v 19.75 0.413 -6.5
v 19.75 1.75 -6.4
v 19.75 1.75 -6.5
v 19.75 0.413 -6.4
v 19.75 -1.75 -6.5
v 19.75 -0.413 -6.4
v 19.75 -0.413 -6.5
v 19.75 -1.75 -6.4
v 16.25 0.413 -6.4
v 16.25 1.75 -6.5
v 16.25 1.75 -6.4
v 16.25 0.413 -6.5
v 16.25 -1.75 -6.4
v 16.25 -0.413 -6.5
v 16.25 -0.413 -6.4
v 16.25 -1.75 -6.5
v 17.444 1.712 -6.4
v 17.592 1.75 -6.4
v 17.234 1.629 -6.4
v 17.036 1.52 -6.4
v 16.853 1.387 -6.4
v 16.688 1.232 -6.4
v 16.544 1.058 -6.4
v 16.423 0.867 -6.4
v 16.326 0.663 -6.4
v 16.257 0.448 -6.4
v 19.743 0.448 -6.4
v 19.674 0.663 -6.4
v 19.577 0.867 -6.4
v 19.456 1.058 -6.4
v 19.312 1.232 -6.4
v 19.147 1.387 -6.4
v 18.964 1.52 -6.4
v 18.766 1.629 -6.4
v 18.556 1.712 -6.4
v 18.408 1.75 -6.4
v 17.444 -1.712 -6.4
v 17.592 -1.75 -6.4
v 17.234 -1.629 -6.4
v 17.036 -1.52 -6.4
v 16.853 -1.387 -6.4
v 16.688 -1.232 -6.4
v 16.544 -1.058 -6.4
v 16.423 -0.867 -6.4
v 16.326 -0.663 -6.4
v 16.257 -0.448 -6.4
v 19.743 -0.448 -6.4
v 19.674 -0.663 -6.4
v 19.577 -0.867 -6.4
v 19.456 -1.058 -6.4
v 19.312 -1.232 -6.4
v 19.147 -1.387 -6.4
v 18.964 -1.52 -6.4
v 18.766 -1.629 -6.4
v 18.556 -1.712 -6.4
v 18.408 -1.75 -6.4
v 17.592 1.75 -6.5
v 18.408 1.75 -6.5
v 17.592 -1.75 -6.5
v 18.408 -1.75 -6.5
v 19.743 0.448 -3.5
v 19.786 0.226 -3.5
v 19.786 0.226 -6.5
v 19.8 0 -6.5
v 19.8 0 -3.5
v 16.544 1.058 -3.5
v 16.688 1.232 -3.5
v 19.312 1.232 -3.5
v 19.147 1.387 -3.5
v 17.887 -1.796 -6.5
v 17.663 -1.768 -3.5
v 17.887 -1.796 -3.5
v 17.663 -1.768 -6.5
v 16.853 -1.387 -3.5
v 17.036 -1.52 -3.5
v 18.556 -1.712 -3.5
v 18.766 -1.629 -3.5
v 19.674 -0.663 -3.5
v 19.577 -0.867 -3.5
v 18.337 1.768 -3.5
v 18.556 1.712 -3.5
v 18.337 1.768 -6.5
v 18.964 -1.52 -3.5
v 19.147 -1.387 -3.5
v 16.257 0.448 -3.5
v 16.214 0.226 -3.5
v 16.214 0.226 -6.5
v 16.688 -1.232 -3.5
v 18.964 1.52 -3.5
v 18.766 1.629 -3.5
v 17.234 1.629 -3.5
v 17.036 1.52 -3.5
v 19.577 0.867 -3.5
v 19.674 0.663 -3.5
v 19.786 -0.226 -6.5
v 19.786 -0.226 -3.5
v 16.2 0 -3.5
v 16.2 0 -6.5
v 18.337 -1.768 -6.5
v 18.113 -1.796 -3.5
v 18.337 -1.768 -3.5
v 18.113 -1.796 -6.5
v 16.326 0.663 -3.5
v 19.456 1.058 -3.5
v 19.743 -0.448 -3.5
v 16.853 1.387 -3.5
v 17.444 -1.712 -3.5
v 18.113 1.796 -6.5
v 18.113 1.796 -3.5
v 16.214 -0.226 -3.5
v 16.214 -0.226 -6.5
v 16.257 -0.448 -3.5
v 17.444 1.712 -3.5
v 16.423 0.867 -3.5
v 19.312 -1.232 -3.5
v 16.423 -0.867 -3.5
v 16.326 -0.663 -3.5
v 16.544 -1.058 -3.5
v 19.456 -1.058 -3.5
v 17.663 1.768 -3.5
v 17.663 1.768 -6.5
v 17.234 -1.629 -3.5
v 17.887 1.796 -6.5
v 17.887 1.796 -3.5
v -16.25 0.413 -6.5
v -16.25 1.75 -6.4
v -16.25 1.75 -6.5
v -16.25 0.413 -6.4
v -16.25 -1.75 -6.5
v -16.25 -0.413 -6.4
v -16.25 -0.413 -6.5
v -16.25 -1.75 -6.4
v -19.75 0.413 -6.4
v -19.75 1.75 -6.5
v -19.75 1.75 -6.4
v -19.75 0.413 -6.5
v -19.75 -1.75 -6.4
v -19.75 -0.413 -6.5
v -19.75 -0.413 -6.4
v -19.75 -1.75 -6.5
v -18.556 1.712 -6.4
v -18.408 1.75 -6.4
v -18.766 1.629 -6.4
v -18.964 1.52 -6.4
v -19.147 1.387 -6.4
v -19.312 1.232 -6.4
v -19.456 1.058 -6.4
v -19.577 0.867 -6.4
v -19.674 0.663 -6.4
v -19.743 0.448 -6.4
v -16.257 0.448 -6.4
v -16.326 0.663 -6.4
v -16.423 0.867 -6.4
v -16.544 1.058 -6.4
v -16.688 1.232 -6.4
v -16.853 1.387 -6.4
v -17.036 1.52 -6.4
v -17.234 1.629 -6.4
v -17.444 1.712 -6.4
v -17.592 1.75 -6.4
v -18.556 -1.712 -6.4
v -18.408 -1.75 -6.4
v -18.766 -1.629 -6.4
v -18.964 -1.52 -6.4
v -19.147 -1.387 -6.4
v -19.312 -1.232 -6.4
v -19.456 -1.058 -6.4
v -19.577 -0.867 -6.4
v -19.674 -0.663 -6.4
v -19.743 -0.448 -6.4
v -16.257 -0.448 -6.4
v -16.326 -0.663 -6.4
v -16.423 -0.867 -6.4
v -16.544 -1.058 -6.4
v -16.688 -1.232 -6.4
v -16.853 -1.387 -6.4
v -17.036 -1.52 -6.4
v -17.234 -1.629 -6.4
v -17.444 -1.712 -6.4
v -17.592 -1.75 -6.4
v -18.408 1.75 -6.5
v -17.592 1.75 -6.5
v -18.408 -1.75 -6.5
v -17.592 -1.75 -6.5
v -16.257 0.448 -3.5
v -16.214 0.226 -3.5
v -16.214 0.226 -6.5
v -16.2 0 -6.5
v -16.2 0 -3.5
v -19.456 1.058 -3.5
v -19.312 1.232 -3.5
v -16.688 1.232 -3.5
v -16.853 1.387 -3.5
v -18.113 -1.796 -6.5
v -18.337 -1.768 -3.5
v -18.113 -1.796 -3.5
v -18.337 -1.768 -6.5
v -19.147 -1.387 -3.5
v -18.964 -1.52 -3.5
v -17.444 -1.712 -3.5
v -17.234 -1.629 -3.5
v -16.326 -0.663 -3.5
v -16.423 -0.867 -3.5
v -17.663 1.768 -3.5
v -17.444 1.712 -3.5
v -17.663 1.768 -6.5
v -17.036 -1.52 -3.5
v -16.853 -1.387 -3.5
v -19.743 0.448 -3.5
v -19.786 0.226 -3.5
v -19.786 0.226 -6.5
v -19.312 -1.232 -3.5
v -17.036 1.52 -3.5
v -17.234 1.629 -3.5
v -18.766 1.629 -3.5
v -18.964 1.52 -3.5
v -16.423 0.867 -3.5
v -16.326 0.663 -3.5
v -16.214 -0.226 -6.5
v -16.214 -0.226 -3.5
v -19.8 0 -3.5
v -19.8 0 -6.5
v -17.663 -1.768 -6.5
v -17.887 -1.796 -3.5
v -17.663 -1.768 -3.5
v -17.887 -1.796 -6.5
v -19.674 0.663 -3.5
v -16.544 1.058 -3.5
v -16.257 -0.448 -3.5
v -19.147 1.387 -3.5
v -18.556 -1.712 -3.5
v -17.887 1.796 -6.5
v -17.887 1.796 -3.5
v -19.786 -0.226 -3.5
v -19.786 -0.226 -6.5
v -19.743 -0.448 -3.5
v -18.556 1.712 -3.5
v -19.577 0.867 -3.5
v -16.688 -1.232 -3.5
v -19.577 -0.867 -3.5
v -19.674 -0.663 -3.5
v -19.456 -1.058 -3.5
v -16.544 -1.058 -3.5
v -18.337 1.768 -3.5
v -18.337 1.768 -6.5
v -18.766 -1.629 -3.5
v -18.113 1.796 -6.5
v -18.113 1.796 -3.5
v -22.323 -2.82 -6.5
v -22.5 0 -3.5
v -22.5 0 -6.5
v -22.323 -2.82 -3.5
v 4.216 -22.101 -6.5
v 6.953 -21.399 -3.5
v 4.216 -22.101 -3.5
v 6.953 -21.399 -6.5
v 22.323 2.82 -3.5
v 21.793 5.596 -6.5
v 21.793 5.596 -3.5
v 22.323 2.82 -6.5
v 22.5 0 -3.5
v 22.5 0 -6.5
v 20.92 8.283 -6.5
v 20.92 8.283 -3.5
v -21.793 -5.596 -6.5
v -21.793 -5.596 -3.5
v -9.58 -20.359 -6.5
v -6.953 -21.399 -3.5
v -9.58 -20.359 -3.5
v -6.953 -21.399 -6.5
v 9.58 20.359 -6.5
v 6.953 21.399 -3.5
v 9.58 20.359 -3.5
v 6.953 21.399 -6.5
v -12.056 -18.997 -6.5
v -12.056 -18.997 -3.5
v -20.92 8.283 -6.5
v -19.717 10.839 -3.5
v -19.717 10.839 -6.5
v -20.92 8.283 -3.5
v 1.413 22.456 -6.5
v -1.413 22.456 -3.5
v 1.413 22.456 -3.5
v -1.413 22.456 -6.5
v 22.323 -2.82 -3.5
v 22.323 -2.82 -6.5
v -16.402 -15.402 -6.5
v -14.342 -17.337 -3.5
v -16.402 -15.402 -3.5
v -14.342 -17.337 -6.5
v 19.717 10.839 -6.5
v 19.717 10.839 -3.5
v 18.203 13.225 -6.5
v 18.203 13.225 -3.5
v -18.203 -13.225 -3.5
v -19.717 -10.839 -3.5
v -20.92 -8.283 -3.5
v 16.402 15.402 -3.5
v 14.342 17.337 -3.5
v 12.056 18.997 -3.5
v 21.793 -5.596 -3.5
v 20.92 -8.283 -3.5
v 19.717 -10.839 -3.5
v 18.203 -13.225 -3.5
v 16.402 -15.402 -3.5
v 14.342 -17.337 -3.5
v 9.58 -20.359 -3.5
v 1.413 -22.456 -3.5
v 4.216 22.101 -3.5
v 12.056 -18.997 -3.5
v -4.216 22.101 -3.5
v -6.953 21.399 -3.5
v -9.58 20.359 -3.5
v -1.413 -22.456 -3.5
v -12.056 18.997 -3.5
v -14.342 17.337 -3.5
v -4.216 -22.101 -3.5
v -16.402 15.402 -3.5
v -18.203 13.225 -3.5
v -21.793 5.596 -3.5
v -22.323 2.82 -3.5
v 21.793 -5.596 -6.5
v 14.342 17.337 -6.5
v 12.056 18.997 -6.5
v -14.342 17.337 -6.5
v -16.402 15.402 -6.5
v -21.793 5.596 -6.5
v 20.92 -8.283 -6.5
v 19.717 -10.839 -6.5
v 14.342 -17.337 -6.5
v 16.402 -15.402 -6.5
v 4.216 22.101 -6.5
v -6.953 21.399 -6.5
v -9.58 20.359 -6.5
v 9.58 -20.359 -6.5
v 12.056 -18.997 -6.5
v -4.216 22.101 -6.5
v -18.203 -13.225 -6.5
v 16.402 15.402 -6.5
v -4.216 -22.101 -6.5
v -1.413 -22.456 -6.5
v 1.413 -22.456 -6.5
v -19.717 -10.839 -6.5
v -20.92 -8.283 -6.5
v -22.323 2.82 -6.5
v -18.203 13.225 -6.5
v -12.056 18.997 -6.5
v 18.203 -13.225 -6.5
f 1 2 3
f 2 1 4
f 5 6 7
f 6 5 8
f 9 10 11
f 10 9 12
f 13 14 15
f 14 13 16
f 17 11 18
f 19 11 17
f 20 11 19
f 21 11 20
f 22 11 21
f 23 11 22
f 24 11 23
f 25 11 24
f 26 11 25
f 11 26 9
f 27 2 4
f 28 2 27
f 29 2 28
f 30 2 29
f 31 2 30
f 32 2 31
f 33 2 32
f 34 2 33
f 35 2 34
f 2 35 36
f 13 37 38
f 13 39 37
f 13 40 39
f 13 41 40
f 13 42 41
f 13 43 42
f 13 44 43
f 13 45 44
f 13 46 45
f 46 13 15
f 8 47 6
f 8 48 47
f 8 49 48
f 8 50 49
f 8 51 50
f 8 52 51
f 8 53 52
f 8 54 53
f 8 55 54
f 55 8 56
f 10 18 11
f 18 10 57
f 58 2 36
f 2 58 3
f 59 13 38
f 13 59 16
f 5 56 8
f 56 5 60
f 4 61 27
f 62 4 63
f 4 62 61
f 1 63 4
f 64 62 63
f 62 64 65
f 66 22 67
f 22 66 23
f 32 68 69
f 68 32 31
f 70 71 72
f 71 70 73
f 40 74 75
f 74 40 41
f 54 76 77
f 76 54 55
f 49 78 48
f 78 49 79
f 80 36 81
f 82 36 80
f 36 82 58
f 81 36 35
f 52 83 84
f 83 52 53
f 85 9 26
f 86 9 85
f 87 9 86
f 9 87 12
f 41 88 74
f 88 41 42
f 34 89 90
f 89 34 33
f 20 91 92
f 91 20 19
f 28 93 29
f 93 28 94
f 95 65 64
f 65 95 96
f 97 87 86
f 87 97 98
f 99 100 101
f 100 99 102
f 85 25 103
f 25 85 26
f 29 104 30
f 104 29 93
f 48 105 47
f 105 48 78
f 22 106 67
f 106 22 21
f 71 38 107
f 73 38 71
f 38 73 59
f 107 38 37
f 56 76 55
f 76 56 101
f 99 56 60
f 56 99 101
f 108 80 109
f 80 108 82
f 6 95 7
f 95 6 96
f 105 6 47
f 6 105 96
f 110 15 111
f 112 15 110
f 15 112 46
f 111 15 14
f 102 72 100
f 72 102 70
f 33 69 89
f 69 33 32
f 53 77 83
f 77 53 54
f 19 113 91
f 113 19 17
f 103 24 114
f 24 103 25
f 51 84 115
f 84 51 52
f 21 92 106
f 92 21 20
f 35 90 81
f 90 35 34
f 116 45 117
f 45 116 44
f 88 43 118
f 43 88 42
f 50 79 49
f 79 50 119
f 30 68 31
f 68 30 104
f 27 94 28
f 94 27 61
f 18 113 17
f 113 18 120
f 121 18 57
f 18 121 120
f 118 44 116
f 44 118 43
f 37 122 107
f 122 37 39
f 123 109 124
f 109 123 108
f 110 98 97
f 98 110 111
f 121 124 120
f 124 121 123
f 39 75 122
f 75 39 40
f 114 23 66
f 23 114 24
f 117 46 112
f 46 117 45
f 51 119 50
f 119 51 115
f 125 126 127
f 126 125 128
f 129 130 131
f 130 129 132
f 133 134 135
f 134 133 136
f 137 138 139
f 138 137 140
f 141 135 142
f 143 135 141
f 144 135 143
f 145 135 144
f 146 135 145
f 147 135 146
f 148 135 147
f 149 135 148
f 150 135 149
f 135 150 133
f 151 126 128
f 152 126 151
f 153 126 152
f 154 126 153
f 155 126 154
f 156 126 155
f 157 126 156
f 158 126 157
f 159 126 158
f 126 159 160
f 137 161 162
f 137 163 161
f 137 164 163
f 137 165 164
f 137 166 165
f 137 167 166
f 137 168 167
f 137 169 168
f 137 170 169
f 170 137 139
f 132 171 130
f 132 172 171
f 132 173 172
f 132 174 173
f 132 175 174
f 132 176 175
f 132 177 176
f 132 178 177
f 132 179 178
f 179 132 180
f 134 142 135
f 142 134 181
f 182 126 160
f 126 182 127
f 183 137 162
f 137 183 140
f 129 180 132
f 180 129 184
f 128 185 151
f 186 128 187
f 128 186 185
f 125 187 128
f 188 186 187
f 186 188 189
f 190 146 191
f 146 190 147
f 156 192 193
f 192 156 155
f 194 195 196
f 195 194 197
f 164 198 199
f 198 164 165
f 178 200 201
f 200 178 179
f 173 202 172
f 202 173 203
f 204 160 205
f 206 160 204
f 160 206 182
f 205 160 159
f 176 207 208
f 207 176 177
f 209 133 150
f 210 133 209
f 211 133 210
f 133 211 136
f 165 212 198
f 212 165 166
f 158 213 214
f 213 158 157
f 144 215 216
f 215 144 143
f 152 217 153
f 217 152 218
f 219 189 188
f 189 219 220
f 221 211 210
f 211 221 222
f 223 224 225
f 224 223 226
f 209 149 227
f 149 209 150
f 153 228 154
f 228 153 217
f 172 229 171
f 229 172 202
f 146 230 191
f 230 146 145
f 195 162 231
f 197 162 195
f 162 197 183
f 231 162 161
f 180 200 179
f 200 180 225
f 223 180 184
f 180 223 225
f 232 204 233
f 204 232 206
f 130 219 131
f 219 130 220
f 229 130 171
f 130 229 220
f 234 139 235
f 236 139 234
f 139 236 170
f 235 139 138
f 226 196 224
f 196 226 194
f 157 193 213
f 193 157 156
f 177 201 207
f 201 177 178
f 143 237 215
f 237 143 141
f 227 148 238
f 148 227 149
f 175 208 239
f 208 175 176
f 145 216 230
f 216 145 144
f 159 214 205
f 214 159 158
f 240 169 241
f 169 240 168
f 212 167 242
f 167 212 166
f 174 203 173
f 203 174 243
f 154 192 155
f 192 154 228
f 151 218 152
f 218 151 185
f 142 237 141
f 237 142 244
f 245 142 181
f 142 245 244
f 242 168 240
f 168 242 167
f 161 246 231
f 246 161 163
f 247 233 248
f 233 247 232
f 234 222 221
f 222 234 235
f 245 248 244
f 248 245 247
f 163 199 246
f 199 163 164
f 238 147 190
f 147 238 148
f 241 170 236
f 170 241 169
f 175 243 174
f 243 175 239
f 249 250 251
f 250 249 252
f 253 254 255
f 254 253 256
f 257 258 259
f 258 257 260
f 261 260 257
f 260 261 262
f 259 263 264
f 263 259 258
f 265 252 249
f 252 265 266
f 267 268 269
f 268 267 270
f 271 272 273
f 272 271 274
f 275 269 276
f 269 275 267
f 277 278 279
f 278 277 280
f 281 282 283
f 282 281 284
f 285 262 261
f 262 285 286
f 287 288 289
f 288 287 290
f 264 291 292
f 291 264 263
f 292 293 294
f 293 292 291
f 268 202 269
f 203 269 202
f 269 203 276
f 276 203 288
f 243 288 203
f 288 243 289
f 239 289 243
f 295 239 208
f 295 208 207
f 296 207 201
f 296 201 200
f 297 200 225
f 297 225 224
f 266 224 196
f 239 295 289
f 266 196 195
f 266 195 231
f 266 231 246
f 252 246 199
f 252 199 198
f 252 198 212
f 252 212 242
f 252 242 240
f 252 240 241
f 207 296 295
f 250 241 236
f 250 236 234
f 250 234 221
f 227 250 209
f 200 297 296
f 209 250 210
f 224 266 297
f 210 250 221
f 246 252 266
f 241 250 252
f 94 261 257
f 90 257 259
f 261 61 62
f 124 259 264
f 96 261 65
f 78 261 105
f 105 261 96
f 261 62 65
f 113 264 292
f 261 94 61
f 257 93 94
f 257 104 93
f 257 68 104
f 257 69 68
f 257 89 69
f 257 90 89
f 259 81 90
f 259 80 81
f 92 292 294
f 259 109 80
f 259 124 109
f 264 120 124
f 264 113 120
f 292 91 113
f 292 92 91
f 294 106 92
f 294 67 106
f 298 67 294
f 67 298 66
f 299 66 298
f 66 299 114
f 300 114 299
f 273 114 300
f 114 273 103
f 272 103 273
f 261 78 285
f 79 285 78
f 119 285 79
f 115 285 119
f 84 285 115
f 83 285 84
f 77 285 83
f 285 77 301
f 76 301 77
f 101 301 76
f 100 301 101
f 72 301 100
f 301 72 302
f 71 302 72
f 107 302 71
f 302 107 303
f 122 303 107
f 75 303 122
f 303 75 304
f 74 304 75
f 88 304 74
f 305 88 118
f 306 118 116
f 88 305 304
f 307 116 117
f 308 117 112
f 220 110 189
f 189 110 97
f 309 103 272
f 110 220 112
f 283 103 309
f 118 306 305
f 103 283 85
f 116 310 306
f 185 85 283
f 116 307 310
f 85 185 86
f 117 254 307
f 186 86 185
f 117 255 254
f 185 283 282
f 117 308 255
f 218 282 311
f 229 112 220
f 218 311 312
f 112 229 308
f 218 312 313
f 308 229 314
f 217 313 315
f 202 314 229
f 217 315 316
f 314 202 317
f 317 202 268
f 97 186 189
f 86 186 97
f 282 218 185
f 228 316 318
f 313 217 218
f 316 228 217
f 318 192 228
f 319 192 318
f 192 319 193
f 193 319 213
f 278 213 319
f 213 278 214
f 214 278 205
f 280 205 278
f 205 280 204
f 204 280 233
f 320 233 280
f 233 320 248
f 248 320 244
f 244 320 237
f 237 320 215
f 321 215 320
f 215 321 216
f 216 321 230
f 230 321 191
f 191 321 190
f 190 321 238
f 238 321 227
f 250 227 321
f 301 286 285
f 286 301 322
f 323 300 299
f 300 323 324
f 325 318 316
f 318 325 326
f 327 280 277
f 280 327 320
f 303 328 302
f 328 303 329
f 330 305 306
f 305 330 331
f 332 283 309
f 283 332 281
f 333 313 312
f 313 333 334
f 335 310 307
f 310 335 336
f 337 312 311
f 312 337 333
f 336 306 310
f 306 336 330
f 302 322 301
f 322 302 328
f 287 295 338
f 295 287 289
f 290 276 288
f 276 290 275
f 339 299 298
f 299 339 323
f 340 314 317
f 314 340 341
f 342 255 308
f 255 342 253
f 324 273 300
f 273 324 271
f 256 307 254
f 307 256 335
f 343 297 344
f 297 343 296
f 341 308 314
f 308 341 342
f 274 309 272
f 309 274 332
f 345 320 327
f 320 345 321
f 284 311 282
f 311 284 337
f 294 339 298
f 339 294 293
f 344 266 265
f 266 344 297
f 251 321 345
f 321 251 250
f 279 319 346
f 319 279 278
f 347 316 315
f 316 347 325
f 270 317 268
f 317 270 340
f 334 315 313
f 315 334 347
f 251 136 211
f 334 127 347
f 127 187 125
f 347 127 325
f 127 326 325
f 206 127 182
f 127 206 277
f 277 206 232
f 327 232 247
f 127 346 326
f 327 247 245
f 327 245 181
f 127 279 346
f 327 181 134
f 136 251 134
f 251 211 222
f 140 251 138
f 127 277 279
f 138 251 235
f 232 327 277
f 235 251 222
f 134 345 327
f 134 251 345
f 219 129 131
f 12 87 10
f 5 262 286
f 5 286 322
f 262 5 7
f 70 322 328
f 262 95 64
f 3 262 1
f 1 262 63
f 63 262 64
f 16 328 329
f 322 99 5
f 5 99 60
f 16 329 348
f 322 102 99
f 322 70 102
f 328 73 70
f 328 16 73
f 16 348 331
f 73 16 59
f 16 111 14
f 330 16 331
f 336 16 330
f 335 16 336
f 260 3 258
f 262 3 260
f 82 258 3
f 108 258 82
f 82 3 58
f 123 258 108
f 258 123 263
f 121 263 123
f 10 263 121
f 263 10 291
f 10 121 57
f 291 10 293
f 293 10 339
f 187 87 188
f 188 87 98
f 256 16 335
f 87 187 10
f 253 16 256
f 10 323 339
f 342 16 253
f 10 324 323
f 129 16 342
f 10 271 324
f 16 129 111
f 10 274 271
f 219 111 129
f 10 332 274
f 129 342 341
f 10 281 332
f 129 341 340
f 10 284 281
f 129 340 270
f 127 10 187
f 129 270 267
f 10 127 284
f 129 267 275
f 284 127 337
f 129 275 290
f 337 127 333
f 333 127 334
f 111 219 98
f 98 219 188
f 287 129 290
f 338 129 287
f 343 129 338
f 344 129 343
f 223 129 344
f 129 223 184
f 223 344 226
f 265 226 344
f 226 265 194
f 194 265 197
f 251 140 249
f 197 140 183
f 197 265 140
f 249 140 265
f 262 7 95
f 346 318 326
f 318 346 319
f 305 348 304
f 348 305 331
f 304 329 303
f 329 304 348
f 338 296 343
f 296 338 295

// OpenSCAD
$fn = 50;


difference() {
	union() {
		translate(v = [0, 0, -6.5000000000]) {
			cylinder(h = 3, r = 22.5000000000);
		}
	}
	union() {
		translate(v = [18.0000000000, 0, 0.5000000000]) {
			rotate(a = [0, 0, 0]) {
				difference() {
					union() {
						translate(v = [0, 0, -10.0000000000]) {
							rotate(a = [0, 0, 0]) {
								difference() {
									union() {
										#translate(v = [-1.7500000000, -3.2500000000, -0.3000000000]) {
											cube(size = [3.5000000000, 6.5000000000, 0.3000000000]);
										}
										#translate(v = [-1.7500000000, -1.7500000000, -0.6000000000]) {
											cube(size = [3.5000000000, 3.5000000000, 0.3000000000]);
										}
										#translate(v = [-1.7500000000, -3.2500000000, 2.5000000000]) {
											cube(size = [3.5000000000, 6.5000000000, 0.3000000000]);
										}
										#translate(v = [-1.7500000000, -1.7500000000, 2.8000000000]) {
											cube(size = [3.5000000000, 3.5000000000, 0.3000000000]);
										}
										#linear_extrude(height = 2.5000000000) {
											polygon(points = [[3.4620000000, 0.0000000000], [1.7310000000, 2.9981799479], [-1.7310000000, 2.9981799479], [-3.4620000000, 0.0000000000], [-1.7310000000, -2.9981799479], [1.7310000000, -2.9981799479]]);
										}
										#translate(v = [-1.7500000000, -3.2500000000, -0.3000000000]) {
											cube(size = [3.5000000000, 6.5000000000, 0.3000000000]);
										}
										#translate(v = [-1.7500000000, -1.7500000000, -0.6000000000]) {
											cube(size = [3.5000000000, 3.5000000000, 0.3000000000]);
										}
										#translate(v = [-1.7500000000, -3.2500000000, 2.5000000000]) {
											cube(size = [3.5000000000, 6.5000000000, 0.3000000000]);
										}
										#translate(v = [-1.7500000000, -1.7500000000, 2.8000000000]) {
											cube(size = [3.5000000000, 3.5000000000, 0.3000000000]);
										}
										#translate(v = [-1.7500000000, -3.2500000000, -0.3000000000]) {
											cube(size = [3.5000000000, 6.5000000000, 0.3000000000]);
										}
										#translate(v = [-1.7500000000, -1.7500000000, -0.6000000000]) {
											cube(size = [3.5000000000, 3.5000000000, 0.3000000000]);
										}
										#translate(v = [-1.7500000000, -3.2500000000, 2.5000000000]) {
											cube(size = [3.5000000000, 6.5000000000, 0.3000000000]);
										}
										#translate(v = [-1.7500000000, -1.7500000000, 2.8000000000]) {
											cube(size = [3.5000000000, 3.5000000000, 0.3000000000]);
										}
									}
									union();
								}
							}
						}
						translate(v = [0, 0, -10.0000000000]) {
							rotate(a = [0, 0, 0]) {
								difference() {
									union() {
										#translate(v = [-1.7500000000, -3.2500000000, -0.3000000000]) {
											cube(size = [3.5000000000, 6.5000000000, 0.3000000000]);
										}
										#translate(v = [-1.7500000000, -1.7500000000, -0.6000000000]) {
											cube(size = [3.5000000000, 3.5000000000, 0.3000000000]);
										}
										#translate(v = [-1.7500000000, -3.2500000000, 2.5000000000]) {
											cube(size = [3.5000000000, 6.5000000000, 0.3000000000]);
										}
										#translate(v = [-1.7500000000, -1.7500000000, 2.8000000000]) {
											cube(size = [3.5000000000, 3.5000000000, 0.3000000000]);
										}
										#linear_extrude(height = 2.5000000000) {
											polygon(points = [[3.4620000000, 0.0000000000], [1.7310000000, 2.9981799479], [-1.7310000000, 2.9981799479], [-3.4620000000, 0.0000000000], [-1.7310000000, -2.9981799479], [1.7310000000, -2.9981799479]]);
										}
										#translate(v = [-1.7500000000, -3.2500000000, -0.3000000000]) {
											cube(size = [3.5000000000, 6.5000000000, 0.3000000000]);
										}
										#translate(v = [-1.7500000000, -1.7500000000, -0.6000000000]) {
											cube(size = [3.5000000000, 3.5000000000, 0.3000000000]);
										}
										#translate(v = [-1.7500000000, -3.2500000000, 2.5000000000]) {
											cube(size = [3.5000000000, 6.5000000000, 0.3000000000]);
										}
										#translate(v = [-1.7500000000, -1.7500000000, 2.8000000000]) {
											cube(size = [3.5000000000, 3.5000000000, 0.3000000000]);
										}
										#translate(v = [-1.7500000000, -3.2500000000, -0.3000000000]) {
											cube(size = [3.5000000000, 6.5000000000, 0.3000000000]);
										}
										#translate(v = [-1.7500000000, -1.7500000000, -0.6000000000]) {
											cube(size = [3.5000000000, 3.5000000000, 0.3000000000]);
										}
										#translate(v = [-1.7500000000, -3.2500000000, 2.5000000000]) {
											cube(size = [3.5000000000, 6.5000000000, 0.3000000000]);
										}
										#translate(v = [-1.7500000000, -1.7500000000, 2.8000000000]) {
											cube(size = [3.5000000000, 3.5000000000, 0.3000000000]);
										}
									}
									union();
								}
							}
						}
						translate(v = [0, 0, -10.0000000000]) {
							rotate(a = [0, 0, 0]) {
								difference() {
									union() {
										#translate(v = [-1.7500000000, -3.2500000000, -0.3000000000]) {
											cube(size = [3.5000000000, 6.5000000000, 0.3000000000]);
										}
										#translate(v = [-1.7500000000, -1.7500000000, -0.6000000000]) {
											cube(size = [3.5000000000, 3.5000000000, 0.3000000000]);
										}
										#translate(v = [-1.7500000000, -3.2500000000, 2.5000000000]) {
											cube(size = [3.5000000000, 6.5000000000, 0.3000000000]);
										}
										#translate(v = [-1.7500000000, -1.7500000000, 2.8000000000]) {
											cube(size = [3.5000000000, 3.5000000000, 0.3000000000]);
										}
										#linear_extrude(height = 2.5000000000) {
											polygon(points = [[3.4620000000, 0.0000000000], [1.7310000000, 2.9981799479], [-1.7310000000, 2.9981799479], [-3.4620000000, 0.0000000000], [-1.7310000000, -2.9981799479], [1.7310000000, -2.9981799479]]);
										}
										#translate(v = [-1.7500000000, -3.2500000000, -0.3000000000]) {
											cube(size = [3.5000000000, 6.5000000000, 0.3000000000]);
										}
										#translate(v = [-1.7500000000, -1.7500000000, -0.6000000000]) {
											cube(size = [3.5000000000, 3.5000000000, 0.3000000000]);
										}
										#translate(v = [-1.7500000000, -3.2500000000, 2.5000000000]) {
											cube(size = [3.5000000000, 6.5000000000, 0.3000000000]);
										}
										#translate(v = [-1.7500000000, -1.7500000000, 2.8000000000]) {
											cube(size = [3.5000000000, 3.5000000000, 0.3000000000]);
										}
										#translate(v = [-1.7500000000, -3.2500000000, -0.3000000000]) {
											cube(size = [3.5000000000, 6.5000000000, 0.3000000000]);
										}
										#translate(v = [-1.7500000000, -1.7500000000, -0.6000000000]) {
											cube(size = [3.5000000000, 3.5000000000, 0.3000000000]);
										}
										#translate(v = [-1.7500000000, -3.2500000000, 2.5000000000]) {
											cube(size = [3.5000000000, 6.5000000000, 0.3000000000]);
										}
										#translate(v = [-1.7500000000, -1.7500000000, 2.8000000000]) {
											cube(size = [3.5000000000, 3.5000000000, 0.3000000000]);
										}
									}
									union();
								}
							}
						}
						#translate(v = [0, 0, -10.0000000000]) {
							cylinder(h = 10, r = 1.5000000000);
						}
						#translate(v = [0, 0, -1.9000000000]) {
							cylinder(h = 1.9000000000, r1 = 1.8000000000, r2 = 3.6000000000);
						}
						#translate(v = [0, 0, -10.0000000000]) {
							cylinder(h = 10, r = 1.8000000000);
						}
						#translate(v = [0, 0, -10.0000000000]) {
							cylinder(h = 10, r = 1.5000000000);
						}
					}
					union();
				}
			}
		}
		translate(v = [-18.0000000000, 0, 0.5000000000]) {
			rotate(a = [0, 0, 0]) {
				difference() {
					union() {
						translate(v = [0, 0, -10.0000000000]) {
							rotate(a = [0, 0, 0]) {
								difference() {
									union() {
										#translate(v = [-1.7500000000, -3.2500000000, -0.3000000000]) {
											cube(size = [3.5000000000, 6.5000000000, 0.3000000000]);
										}
										#translate(v = [-1.7500000000, -1.7500000000, -0.6000000000]) {
											cube(size = [3.5000000000, 3.5000000000, 0.3000000000]);
										}
										#translate(v = [-1.7500000000, -3.2500000000, 2.5000000000]) {
											cube(size = [3.5000000000, 6.5000000000, 0.3000000000]);
										}
										#translate(v = [-1.7500000000, -1.7500000000, 2.8000000000]) {
											cube(size = [3.5000000000, 3.5000000000, 0.3000000000]);
										}
										#linear_extrude(height = 2.5000000000) {
											polygon(points = [[3.4620000000, 0.0000000000], [1.7310000000, 2.9981799479], [-1.7310000000, 2.9981799479], [-3.4620000000, 0.0000000000], [-1.7310000000, -2.9981799479], [1.7310000000, -2.9981799479]]);
										}
										#translate(v = [-1.7500000000, -3.2500000000, -0.3000000000]) {
											cube(size = [3.5000000000, 6.5000000000, 0.3000000000]);
										}
										#translate(v = [-1.7500000000, -1.7500000000, -0.6000000000]) {
											cube(size = [3.5000000000, 3.5000000000, 0.3000000000]);
										}
										#translate(v = [-1.7500000000, -3.2500000000, 2.5000000000]) {
											cube(size = [3.5000000000, 6.5000000000, 0.3000000000]);
										}
										#translate(v = [-1.7500000000, -1.7500000000, 2.8000000000]) {
											cube(size = [3.5000000000, 3.5000000000, 0.3000000000]);
										}
										#translate(v = [-1.7500000000, -3.2500000000, -0.3000000000]) {
											cube(size = [3.5000000000, 6.5000000000, 0.3000000000]);
										}
										#translate(v = [-1.7500000000, -1.7500000000, -0.6000000000]) {
											cube(size = [3.5000000000, 3.5000000000, 0.3000000000]);
										}
										#translate(v = [-1.7500000000, -3.2500000000, 2.5000000000]) {
											cube(size = [3.5000000000, 6.5000000000, 0.3000000000]);
										}
										#translate(v = [-1.7500000000, -1.7500000000, 2.8000000000]) {
											cube(size = [3.5000000000, 3.5000000000, 0.3000000000]);
										}
									}
									union();
								}
							}
						}
						translate(v = [0, 0, -10.0000000000]) {
							rotate(a = [0, 0, 0]) {
								difference() {
									union() {
										#translate(v = [-1.7500000000, -3.2500000000, -0.3000000000]) {
											cube(size = [3.5000000000, 6.5000000000, 0.3000000000]);
										}
										#translate(v = [-1.7500000000, -1.7500000000, -0.6000000000]) {
											cube(size = [3.5000000000, 3.5000000000, 0.3000000000]);
										}
										#translate(v = [-1.7500000000, -3.2500000000, 2.5000000000]) {
											cube(size = [3.5000000000, 6.5000000000, 0.3000000000]);
										}
										#translate(v = [-1.7500000000, -1.7500000000, 2.8000000000]) {
											cube(size = [3.5000000000, 3.5000000000, 0.3000000000]);
										}
										#linear_extrude(height = 2.5000000000) {
											polygon(points = [[3.4620000000, 0.0000000000], [1.7310000000, 2.9981799479], [-1.7310000000, 2.9981799479], [-3.4620000000, 0.0000000000], [-1.7310000000, -2.9981799479], [1.7310000000, -2.9981799479]]);
										}
										#translate(v = [-1.7500000000, -3.2500000000, -0.3000000000]) {
											cube(size = [3.5000000000, 6.5000000000, 0.3000000000]);
										}
										#translate(v = [-1.7500000000, -1.7500000000, -0.6000000000]) {
											cube(size = [3.5000000000, 3.5000000000, 0.3000000000]);
										}
										#translate(v = [-1.7500000000, -3.2500000000, 2.5000000000]) {
											cube(size = [3.5000000000, 6.5000000000, 0.3000000000]);
										}
										#translate(v = [-1.7500000000, -1.7500000000, 2.8000000000]) {
											cube(size = [3.5000000000, 3.5000000000, 0.3000000000]);
										}
										#translate(v = [-1.7500000000, -3.2500000000, -0.3000000000]) {
											cube(size = [3.5000000000, 6.5000000000, 0.3000000000]);
										}
										#translate(v = [-1.7500000000, -1.7500000000, -0.6000000000]) {
											cube(size = [3.5000000000, 3.5000000000, 0.3000000000]);
										}
										#translate(v = [-1.7500000000, -3.2500000000, 2.5000000000]) {
											cube(size = [3.5000000000, 6.5000000000, 0.3000000000]);
										}
										#translate(v = [-1.7500000000, -1.7500000000, 2.8000000000]) {
											cube(size = [3.5000000000, 3.5000000000, 0.3000000000]);
										}
									}
									union();
								}
							}
						}
						translate(v = [0, 0, -10.0000000000]) {
							rotate(a = [0, 0, 0]) {
								difference() {
									union() {
										#translate(v = [-1.7500000000, -3.2500000000, -0.3000000000]) {
											cube(size = [3.5000000000, 6.5000000000, 0.3000000000]);
										}
										#translate(v = [-1.7500000000, -1.7500000000, -0.6000000000]) {
											cube(size = [3.5000000000, 3.5000000000, 0.3000000000]);
										}
										#translate(v = [-1.7500000000, -3.2500000000, 2.5000000000]) {
											cube(size = [3.5000000000, 6.5000000000, 0.3000000000]);
										}
										#translate(v = [-1.7500000000, -1.7500000000, 2.8000000000]) {
											cube(size = [3.5000000000, 3.5000000000, 0.3000000000]);
										}
										#linear_extrude(height = 2.5000000000) {
											polygon(points = [[3.4620000000, 0.0000000000], [1.7310000000, 2.9981799479], [-1.7310000000, 2.9981799479], [-3.4620000000, 0.0000000000], [-1.7310000000, -2.9981799479], [1.7310000000, -2.9981799479]]);
										}
										#translate(v = [-1.7500000000, -3.2500000000, -0.3000000000]) {
											cube(size = [3.5000000000, 6.5000000000, 0.3000000000]);
										}
										#translate(v = [-1.7500000000, -1.7500000000, -0.6000000000]) {
											cube(size = [3.5000000000, 3.5000000000, 0.3000000000]);
										}
										#translate(v = [-1.7500000000, -3.2500000000, 2.5000000000]) {
											cube(size = [3.5000000000, 6.5000000000, 0.3000000000]);
										}
										#translate(v = [-1.7500000000, -1.7500000000, 2.8000000000]) {
											cube(size = [3.5000000000, 3.5000000000, 0.3000000000]);
										}
										#translate(v = [-1.7500000000, -3.2500000000, -0.3000000000]) {
											cube(size = [3.5000000000, 6.5000000000, 0.3000000000]);
										}
										#translate(v = [-1.7500000000, -1.7500000000, -0.6000000000]) {
											cube(size = [3.5000000000, 3.5000000000, 0.3000000000]);
										}
										#translate(v = [-1.7500000000, -3.2500000000, 2.5000000000]) {
											cube(size = [3.5000000000, 6.5000000000, 0.3000000000]);
										}
										#translate(v = [-1.7500000000, -1.7500000000, 2.8000000000]) {
											cube(size = [3.5000000000, 3.5000000000, 0.3000000000]);
										}
									}
									union();
								}
							}
						}
						#translate(v = [0, 0, -10.0000000000]) {
							cylinder(h = 10, r = 1.5000000000);
						}
						#translate(v = [0, 0, -1.9000000000]) {
							cylinder(h = 1.9000000000, r1 = 1.8000000000, r2 = 3.6000000000);
						}
						#translate(v = [0, 0, -10.0000000000]) {
							cylinder(h = 10, r = 1.8000000000);
						}
						#translate(v = [0, 0, -10.0000000000]) {
							cylinder(h = 10, r = 1.5000000000);
						}
					}
					union();
				}
			}
		}
		translate(v = [0, 0, -0.5000000000]) {
			cylinder(h = 2, r = 20.5000000000);
		}
	}
}
